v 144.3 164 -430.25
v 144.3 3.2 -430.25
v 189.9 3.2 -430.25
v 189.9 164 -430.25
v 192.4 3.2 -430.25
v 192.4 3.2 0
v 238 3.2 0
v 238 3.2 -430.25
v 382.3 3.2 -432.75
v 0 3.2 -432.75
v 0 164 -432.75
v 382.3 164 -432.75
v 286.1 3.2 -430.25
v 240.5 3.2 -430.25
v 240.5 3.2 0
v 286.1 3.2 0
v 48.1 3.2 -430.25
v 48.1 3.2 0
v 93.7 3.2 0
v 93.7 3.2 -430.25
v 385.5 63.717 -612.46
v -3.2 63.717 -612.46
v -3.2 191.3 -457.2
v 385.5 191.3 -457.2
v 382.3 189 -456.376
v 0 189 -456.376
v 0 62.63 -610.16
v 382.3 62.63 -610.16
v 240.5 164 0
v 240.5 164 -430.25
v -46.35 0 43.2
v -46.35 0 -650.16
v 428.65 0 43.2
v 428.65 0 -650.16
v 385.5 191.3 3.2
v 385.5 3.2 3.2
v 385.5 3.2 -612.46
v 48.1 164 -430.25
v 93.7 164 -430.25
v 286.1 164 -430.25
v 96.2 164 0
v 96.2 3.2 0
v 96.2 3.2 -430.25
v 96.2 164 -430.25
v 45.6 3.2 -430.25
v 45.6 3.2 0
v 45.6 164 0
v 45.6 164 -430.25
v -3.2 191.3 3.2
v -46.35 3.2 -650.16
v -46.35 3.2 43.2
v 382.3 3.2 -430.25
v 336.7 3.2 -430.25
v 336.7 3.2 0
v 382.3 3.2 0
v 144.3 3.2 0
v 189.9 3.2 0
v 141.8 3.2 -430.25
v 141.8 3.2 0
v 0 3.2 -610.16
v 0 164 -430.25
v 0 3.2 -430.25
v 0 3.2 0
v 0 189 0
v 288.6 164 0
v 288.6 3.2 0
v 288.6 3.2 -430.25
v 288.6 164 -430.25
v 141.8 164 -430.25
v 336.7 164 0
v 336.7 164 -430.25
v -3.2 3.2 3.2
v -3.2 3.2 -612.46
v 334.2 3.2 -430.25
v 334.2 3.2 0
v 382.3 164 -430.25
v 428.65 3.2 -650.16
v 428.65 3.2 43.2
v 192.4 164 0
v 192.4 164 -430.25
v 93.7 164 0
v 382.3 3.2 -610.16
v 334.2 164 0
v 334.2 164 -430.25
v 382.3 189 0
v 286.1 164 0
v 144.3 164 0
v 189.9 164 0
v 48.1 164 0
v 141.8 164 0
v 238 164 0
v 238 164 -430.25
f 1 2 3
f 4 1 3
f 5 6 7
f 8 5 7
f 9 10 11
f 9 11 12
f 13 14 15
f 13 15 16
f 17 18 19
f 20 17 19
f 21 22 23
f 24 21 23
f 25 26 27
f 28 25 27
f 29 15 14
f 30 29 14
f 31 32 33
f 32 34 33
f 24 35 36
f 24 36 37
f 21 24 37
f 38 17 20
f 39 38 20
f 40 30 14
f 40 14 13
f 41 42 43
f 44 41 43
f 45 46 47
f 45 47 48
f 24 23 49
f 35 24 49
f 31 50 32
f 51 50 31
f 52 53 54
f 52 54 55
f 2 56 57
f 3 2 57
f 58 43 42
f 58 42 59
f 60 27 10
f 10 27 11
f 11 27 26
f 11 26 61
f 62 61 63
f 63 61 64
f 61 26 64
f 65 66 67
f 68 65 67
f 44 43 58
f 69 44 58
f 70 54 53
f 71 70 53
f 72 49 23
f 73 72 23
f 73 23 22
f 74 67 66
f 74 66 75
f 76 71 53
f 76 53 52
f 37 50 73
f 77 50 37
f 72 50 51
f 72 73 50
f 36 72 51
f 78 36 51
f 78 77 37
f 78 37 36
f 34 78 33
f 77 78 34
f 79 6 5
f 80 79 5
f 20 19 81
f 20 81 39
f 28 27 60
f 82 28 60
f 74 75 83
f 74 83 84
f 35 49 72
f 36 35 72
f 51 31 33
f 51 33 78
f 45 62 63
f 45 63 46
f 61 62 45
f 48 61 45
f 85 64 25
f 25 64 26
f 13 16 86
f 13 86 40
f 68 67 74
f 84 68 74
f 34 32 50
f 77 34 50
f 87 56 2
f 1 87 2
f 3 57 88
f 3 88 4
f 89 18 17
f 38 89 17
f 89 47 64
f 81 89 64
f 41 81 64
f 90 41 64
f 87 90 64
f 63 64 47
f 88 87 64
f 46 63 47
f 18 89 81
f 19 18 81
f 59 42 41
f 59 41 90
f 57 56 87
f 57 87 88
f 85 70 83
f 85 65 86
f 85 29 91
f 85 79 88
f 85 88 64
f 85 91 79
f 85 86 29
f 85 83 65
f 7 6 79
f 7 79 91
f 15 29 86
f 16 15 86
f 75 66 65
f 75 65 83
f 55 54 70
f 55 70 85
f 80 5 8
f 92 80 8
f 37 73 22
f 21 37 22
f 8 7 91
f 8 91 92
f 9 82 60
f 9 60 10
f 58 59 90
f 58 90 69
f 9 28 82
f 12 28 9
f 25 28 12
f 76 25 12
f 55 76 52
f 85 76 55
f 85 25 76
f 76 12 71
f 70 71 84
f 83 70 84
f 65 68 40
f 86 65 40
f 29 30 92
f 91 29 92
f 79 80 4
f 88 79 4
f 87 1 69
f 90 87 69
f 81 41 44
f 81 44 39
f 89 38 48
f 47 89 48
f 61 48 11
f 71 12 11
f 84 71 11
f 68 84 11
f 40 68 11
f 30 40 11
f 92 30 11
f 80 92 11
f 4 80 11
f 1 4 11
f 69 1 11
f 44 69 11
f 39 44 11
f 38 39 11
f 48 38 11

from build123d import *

# Parameters (mm, degrees)
SKETCH1_W            = 388.7
SKETCH1_H            = 435.95
SKETCH1_W_2          = 45.6
SKETCH1_H_2          = 430.25
BOSS_EXTRUDE1_DEPTH  = 189
BOSS_EXTRUDE2_START  = -433.45
SKETCH2_W            = 388.7
SKETCH2_H            = 3.2
BOSS_EXTRUDE2_DEPTH  = 430.25
CUT_EXTRUDE1_DEPTH   = 25
BOSS_EXTRUDE4_DEPTH  = 3.2
BOSS_EXTRUDE5_DEPTH  = 3.2
BOSS_EXTRUDE6_REACH  = 791.664
CUT_EXTRUDE2_REACH   = 793.231
SKETCH11_W           = 52.59
SKETCH11_H           = 168.019571709
BOSS_EXTRUDE7_DEPTH  = 3.2
BOSS_EXTRUDE8_DEPTH  = 3.2
SKETCH14_W           = 388.7
SKETCH14_H           = 3.2
BOSS_EXTRUDE9_DEPTH  = 40
SKETCH15_W           = 388.7
SKETCH15_H           = 3.2
BOSS_EXTRUDE10_DEPTH = 40
SKETCH16_W           = 693.36
SKETCH16_H           = 3.2
BOSS_EXTRUDE11_DEPTH = 43.15
SKETCH17_W           = 693.36
SKETCH17_H           = 3.2
BOSS_EXTRUDE12_DEPTH = 43.15
BOSS_EXTRUDE13_DEPTH = 388.7


with BuildPart() as part:
    # Sketch1 → Boss-Extrude1 (new body)
    with BuildSketch(Plane(origin=(0, 0, 0), x_dir=(1, 0, 0), z_dir=(0, 1, 0))):
        with Locations((191.15, 214.775)):
            Rectangle(SKETCH1_W, SKETCH1_H)
        with Locations((22.8, 215.125)):
            Rectangle(SKETCH1_W_2, SKETCH1_H_2, mode=Mode.SUBTRACT)
        with Locations((359.5, 215.125)):
            Rectangle(SKETCH1_W_2, SKETCH1_H_2, mode=Mode.SUBTRACT)
        with Locations((70.9, 215.125)):
            Rectangle(SKETCH1_W_2, SKETCH1_H_2, mode=Mode.SUBTRACT)
        with Locations((119, 215.125)):
            Rectangle(SKETCH1_W_2, SKETCH1_H_2, mode=Mode.SUBTRACT)
        with Locations((167.1, 215.125)):
            Rectangle(SKETCH1_W_2, SKETCH1_H_2, mode=Mode.SUBTRACT)
        with Locations((215.2, 215.125)):
            Rectangle(SKETCH1_W_2, SKETCH1_H_2, mode=Mode.SUBTRACT)
        with Locations((263.3, 215.125)):
            Rectangle(SKETCH1_W_2, SKETCH1_H_2, mode=Mode.SUBTRACT)
        with Locations((311.4, 215.125)):
            Rectangle(SKETCH1_W_2, SKETCH1_H_2, mode=Mode.SUBTRACT)
    extrude(amount=BOSS_EXTRUDE1_DEPTH)

    # Sketch2 → Boss-Extrude2 (add)
    with BuildSketch(Plane.XY.offset(3.2).offset(BOSS_EXTRUDE2_START)):
        with Locations((191.15, 1.6)):
            Rectangle(SKETCH2_W, SKETCH2_H)
    extrude(amount=BOSS_EXTRUDE2_DEPTH)

    # Sketch3 → Cut-Extrude1 (cut)
    with BuildSketch(Plane(origin=(0, 189, 0), x_dir=(1, 0, 0), z_dir=(0, 1, 0))):
        Polygon((0, 430.25), (0, 432.75), (382.3, 432.75), (382.3, 430.25), (336.7, 430.25), (336.7, 0), (334.2, 0), (334.2, 430.25), (288.6, 430.25), (288.6, 0), (286.1, 0), (286.1, 430.25), (240.5, 430.25), (240.5, 0), (238, 0), (238, 430.25), (192.4, 430.25), (192.4, 0), (189.9, 0), (189.9, 430.25), (144.3, 430.25), (144.3, 0), (141.8, 0), (141.8, 430.25), (96.2, 430.25), (96.2, 0), (93.7, 0), (93.7, 430.25), (48.1, 430.25), (48.1, 0), (45.6, 0), (45.6, 430.25), align=None)
    extrude(amount=-CUT_EXTRUDE1_DEPTH, mode=Mode.SUBTRACT)

    # Sketch4 → Boss-Extrude4 (add)
    with BuildSketch(Plane(origin=(385.5, 0, 0), x_dir=(0, 0, -1), z_dir=(1, 0, 0))):
        Polygon((432.75, 189), (662.75, 0), (432.75, 0), align=None)
    extrude(amount=-BOSS_EXTRUDE4_DEPTH)

    # Sketch7 → Boss-Extrude5 (add)
    with BuildSketch(Plane.ZY.offset(3.2)):
        Polygon((-432.75, 164), (-432.75, 189), (-662.75, 0), (-432.75, 0), align=None)
    extrude(amount=-BOSS_EXTRUDE5_DEPTH)

    # Sketch9 → Boss-Extrude6 (add, up to next)
    with BuildSketch(Plane(origin=(0, 0, 0), x_dir=(0, 0, -1), z_dir=(1, 0, 0)), mode=Mode.PRIVATE) as boss_extrude6_sk1:
        Polygon((662.75, 0), (658.855820106, 3.2), (432.75, 3.2), (432.75, 0), align=None)
    boss_extrude6_tool1 = extrude(boss_extrude6_sk1.sketch, amount=BOSS_EXTRUDE6_REACH, mode=Mode.PRIVATE) - part.part
    add(boss_extrude6_tool1.solids().sort_by_distance((0, 1.595446, -546.779226))[0])

    # Sketch11 → Cut-Extrude2 (cut, up to next)
    with BuildSketch(Plane(origin=(385.5, 0, 0), x_dir=(0, 0, -1), z_dir=(1, 0, 0)), mode=Mode.PRIVATE) as cut_extrude2_sk1:
        with Locations((636.455, 84.009785855)):
            Rectangle(SKETCH11_W, SKETCH11_H)
    cut_extrude2_tool1 = extrude(cut_extrude2_sk1.sketch, amount=-CUT_EXTRUDE2_REACH, mode=Mode.PRIVATE) & part.part
    add(cut_extrude2_tool1.solids().sort_by_distance((385.5, 84.009786, -636.455))[0], mode=Mode.SUBTRACT)

    # Sketch12 → Boss-Extrude7 (add)
    with BuildSketch(Plane(origin=(385.5, 0, 0), x_dir=(0, 0, -1), z_dir=(1, 0, 0))):
        Polygon((456.376412276, 189), (610.16, 62.630008348), (610.16, 43.21526087), (432.75, 189), align=None)
    extrude(amount=-BOSS_EXTRUDE7_DEPTH)

    # Sketch13 → Boss-Extrude8 (add)
    with BuildSketch(Plane.ZY.offset(3.2)):
        Polygon((-610.16, 62.630008348), (-610.16, 43.21526087), (-432.75, 189), (-456.376412276, 189), align=None)
    extrude(amount=-BOSS_EXTRUDE8_DEPTH)

    # Sketch14 → Boss-Extrude9 (add)
    with BuildSketch(Plane(origin=(0, 0, -610.16), x_dir=(-1, 0, 0), z_dir=(0, 0, -1))):
        with Locations((-191.15, 1.6)):
            Rectangle(SKETCH14_W, SKETCH14_H)
    extrude(amount=BOSS_EXTRUDE9_DEPTH)

    # Sketch15 → Boss-Extrude10 (add)
    with BuildSketch(Plane.XY.offset(3.2)):
        with Locations((191.15, 1.6)):
            Rectangle(SKETCH15_W, SKETCH15_H)
    extrude(amount=BOSS_EXTRUDE10_DEPTH)

    # Sketch16 → Boss-Extrude11 (add)
    with BuildSketch(Plane(origin=(385.5, 0, 0), x_dir=(0, 0, -1), z_dir=(1, 0, 0))):
        with Locations((303.48, 1.6)):
            Rectangle(SKETCH16_W, SKETCH16_H)
    extrude(amount=BOSS_EXTRUDE11_DEPTH)

    # Sketch17 → Boss-Extrude12 (add)
    with BuildSketch(Plane.ZY.offset(3.2)):
        with Locations((-303.48, 1.6)):
            Rectangle(SKETCH17_W, SKETCH17_H)
    extrude(amount=BOSS_EXTRUDE12_DEPTH)

    # Sketch18 → Boss-Extrude13 (add)
    with BuildSketch(Plane.ZY.offset(3.2)):
        Polygon((-457.200187026, 191.3), (3.2, 191.3), (3.2, 189), (-456.376412276, 189), (-610.16, 62.630008348), (-610.16, 3.2), (-612.46, 3.2), (-612.46, 63.716936295), align=None)
    extrude(amount=-BOSS_EXTRUDE13_DEPTH)


solid = part.part
